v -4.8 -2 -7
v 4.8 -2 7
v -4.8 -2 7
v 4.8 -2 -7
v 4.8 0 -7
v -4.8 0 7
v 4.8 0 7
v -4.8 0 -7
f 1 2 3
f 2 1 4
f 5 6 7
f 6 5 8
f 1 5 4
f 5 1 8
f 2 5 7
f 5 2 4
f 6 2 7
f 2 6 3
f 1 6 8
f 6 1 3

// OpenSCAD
rotate([90,0,0])
translate([-9.6/2,-14/2,0])
{
	cube([9.6,14,2]);
}
